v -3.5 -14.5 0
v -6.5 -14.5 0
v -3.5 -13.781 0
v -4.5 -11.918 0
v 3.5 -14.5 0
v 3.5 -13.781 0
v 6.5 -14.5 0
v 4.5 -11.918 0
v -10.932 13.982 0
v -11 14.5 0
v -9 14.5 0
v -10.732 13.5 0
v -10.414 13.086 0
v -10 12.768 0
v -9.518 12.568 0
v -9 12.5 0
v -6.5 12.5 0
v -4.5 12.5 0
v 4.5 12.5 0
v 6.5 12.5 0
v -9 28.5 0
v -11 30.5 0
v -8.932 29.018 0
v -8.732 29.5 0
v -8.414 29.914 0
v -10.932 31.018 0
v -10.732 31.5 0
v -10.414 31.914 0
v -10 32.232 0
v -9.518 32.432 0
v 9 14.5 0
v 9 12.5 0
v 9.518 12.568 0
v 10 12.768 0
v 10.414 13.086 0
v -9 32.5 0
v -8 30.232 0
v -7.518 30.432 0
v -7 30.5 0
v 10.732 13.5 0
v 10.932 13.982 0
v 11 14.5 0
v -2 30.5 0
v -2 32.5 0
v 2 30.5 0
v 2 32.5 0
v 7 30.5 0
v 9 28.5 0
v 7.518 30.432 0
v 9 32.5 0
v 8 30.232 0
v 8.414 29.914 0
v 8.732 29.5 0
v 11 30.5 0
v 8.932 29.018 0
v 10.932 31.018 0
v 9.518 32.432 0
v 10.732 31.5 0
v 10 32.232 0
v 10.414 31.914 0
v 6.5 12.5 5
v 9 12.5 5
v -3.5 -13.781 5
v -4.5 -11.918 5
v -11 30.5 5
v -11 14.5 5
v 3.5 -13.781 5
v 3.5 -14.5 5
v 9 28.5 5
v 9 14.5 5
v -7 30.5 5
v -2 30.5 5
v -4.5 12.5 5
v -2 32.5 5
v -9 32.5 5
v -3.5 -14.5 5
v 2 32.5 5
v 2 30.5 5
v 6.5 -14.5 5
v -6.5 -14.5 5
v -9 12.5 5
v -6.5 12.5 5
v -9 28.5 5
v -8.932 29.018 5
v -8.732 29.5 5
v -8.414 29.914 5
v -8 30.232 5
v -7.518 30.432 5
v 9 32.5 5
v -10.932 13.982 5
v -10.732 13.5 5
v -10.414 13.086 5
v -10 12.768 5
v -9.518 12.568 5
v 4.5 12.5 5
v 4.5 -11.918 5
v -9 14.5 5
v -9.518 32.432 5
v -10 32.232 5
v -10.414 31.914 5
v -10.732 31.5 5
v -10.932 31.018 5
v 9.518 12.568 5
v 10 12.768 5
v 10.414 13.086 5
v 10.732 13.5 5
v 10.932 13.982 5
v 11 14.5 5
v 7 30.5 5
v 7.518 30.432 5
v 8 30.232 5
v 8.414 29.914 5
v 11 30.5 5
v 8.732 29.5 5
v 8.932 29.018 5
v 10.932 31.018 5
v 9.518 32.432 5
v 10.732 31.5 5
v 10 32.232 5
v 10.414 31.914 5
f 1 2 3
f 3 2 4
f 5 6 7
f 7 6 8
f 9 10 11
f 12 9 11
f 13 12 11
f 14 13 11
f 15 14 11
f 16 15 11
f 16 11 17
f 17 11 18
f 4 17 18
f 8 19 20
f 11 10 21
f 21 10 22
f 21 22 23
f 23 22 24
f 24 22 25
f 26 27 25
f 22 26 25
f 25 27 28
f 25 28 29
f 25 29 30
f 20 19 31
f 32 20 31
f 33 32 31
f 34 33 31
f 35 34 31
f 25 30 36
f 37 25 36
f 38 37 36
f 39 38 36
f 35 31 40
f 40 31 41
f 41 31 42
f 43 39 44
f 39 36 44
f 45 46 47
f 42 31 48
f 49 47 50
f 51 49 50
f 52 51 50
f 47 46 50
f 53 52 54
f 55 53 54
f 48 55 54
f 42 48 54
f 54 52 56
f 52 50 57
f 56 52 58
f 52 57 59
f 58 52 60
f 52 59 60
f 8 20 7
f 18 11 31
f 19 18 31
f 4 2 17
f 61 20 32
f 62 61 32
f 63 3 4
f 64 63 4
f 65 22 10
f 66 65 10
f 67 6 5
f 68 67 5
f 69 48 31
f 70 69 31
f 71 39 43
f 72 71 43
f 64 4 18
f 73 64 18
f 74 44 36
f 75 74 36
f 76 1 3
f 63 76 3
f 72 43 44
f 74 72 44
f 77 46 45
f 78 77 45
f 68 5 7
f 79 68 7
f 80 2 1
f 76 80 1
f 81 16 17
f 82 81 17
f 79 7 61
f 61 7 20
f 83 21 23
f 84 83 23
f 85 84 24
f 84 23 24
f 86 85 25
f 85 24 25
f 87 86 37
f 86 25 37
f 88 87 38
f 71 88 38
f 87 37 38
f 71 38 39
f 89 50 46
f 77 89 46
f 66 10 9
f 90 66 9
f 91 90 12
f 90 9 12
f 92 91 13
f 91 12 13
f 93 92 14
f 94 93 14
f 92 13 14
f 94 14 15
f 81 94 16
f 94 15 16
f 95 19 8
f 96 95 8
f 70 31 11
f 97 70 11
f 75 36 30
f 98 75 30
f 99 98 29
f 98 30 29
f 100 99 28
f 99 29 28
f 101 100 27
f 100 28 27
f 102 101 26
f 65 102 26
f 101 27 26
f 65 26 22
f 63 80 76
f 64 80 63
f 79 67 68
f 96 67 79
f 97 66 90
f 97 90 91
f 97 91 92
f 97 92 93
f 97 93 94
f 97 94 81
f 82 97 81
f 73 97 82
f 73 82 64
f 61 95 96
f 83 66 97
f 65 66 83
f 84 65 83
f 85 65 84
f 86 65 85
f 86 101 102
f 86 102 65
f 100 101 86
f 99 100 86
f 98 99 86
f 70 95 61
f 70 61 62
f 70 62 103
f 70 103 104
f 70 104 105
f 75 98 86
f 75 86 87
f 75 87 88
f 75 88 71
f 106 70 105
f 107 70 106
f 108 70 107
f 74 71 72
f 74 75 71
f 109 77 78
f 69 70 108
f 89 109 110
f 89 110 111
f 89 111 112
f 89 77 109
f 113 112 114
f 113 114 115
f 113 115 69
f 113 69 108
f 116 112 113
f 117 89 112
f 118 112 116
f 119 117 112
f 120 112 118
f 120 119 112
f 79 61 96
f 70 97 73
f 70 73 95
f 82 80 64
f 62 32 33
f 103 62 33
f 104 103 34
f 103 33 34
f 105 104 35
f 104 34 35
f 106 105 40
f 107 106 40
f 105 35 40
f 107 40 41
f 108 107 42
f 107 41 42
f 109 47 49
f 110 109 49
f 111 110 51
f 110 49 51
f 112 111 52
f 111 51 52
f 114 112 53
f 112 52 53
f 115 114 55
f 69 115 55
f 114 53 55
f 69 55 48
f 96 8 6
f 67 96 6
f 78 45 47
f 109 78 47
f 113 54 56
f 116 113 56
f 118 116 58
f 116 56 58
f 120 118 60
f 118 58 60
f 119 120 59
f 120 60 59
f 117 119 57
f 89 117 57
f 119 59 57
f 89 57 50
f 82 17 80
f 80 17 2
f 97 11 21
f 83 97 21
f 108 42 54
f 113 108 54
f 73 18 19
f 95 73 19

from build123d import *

# Parameters (mm, degrees)
F1_DEPTH = 5


with BuildPart() as f1:
    # F0 (on Top) → F1 (new body)
    with BuildSketch(Plane.XY):
        with BuildLine():
            Line((-4.5, 12.5), (0, 12.5))
            Line((0, 12.5), (4.5, 12.5))
            Line((4.5, 12.5), (4.5, 0))
            Line((4.5, 0), (4.5, -11.917724))
            Line((4.5, -11.917724), (3.5, -13.781429))
            Line((3.5, -13.781429), (3.5, -14.5))
            Line((3.5, -14.5), (6.5, -14.5))
            Line((6.5, -14.5), (6.5, -12.5))
            Line((6.5, -12.5), (6.5, 12.5))
            Line((6.5, 12.5), (9, 12.5))
            ThreePointArc((9, 12.5), (10.414214, 13.085786), (11, 14.5))
            Line((11, 14.5), (11, 30.5))
            ThreePointArc((11, 30.5), (10.414214, 31.914214), (9, 32.5))
            Line((9, 32.5), (2, 32.5))
            Line((2, 32.5), (2, 30.5))
            Line((2, 30.5), (7, 30.5))
            ThreePointArc((7, 30.5), (8.414214, 29.914214), (9, 28.5))
            Line((9, 28.5), (9, 14.5))
            Line((9, 14.5), (-9, 14.5))
            Line((-9, 14.5), (-9, 28.5))
            ThreePointArc((-9, 28.5), (-8.414214, 29.914214), (-7, 30.5))
            Line((-7, 30.5), (-2, 30.5))
            Line((-2, 30.5), (-2, 32.5))
            Line((-2, 32.5), (-9, 32.5))
            ThreePointArc((-9, 32.5), (-10.414214, 31.914214), (-11, 30.5))
            Line((-11, 30.5), (-11, 14.5))
            ThreePointArc((-11, 14.5), (-10.414214, 13.085786), (-9, 12.5))
            Line((-9, 12.5), (-6.5, 12.5))
            Line((-6.5, 12.5), (-6.5, -12.5))
            Line((-6.5, -12.5), (-6.5, -14.5))
            Line((-6.5, -14.5), (-3.5, -14.5))
            Line((-3.5, -14.5), (-3.5, -13.781429))
            Line((-3.5, -13.781429), (-4.5, -11.917724))
            Line((-4.5, -11.917724), (-4.5, 12.5))
        make_face()
    extrude(amount=F1_DEPTH)


solid = f1.part
